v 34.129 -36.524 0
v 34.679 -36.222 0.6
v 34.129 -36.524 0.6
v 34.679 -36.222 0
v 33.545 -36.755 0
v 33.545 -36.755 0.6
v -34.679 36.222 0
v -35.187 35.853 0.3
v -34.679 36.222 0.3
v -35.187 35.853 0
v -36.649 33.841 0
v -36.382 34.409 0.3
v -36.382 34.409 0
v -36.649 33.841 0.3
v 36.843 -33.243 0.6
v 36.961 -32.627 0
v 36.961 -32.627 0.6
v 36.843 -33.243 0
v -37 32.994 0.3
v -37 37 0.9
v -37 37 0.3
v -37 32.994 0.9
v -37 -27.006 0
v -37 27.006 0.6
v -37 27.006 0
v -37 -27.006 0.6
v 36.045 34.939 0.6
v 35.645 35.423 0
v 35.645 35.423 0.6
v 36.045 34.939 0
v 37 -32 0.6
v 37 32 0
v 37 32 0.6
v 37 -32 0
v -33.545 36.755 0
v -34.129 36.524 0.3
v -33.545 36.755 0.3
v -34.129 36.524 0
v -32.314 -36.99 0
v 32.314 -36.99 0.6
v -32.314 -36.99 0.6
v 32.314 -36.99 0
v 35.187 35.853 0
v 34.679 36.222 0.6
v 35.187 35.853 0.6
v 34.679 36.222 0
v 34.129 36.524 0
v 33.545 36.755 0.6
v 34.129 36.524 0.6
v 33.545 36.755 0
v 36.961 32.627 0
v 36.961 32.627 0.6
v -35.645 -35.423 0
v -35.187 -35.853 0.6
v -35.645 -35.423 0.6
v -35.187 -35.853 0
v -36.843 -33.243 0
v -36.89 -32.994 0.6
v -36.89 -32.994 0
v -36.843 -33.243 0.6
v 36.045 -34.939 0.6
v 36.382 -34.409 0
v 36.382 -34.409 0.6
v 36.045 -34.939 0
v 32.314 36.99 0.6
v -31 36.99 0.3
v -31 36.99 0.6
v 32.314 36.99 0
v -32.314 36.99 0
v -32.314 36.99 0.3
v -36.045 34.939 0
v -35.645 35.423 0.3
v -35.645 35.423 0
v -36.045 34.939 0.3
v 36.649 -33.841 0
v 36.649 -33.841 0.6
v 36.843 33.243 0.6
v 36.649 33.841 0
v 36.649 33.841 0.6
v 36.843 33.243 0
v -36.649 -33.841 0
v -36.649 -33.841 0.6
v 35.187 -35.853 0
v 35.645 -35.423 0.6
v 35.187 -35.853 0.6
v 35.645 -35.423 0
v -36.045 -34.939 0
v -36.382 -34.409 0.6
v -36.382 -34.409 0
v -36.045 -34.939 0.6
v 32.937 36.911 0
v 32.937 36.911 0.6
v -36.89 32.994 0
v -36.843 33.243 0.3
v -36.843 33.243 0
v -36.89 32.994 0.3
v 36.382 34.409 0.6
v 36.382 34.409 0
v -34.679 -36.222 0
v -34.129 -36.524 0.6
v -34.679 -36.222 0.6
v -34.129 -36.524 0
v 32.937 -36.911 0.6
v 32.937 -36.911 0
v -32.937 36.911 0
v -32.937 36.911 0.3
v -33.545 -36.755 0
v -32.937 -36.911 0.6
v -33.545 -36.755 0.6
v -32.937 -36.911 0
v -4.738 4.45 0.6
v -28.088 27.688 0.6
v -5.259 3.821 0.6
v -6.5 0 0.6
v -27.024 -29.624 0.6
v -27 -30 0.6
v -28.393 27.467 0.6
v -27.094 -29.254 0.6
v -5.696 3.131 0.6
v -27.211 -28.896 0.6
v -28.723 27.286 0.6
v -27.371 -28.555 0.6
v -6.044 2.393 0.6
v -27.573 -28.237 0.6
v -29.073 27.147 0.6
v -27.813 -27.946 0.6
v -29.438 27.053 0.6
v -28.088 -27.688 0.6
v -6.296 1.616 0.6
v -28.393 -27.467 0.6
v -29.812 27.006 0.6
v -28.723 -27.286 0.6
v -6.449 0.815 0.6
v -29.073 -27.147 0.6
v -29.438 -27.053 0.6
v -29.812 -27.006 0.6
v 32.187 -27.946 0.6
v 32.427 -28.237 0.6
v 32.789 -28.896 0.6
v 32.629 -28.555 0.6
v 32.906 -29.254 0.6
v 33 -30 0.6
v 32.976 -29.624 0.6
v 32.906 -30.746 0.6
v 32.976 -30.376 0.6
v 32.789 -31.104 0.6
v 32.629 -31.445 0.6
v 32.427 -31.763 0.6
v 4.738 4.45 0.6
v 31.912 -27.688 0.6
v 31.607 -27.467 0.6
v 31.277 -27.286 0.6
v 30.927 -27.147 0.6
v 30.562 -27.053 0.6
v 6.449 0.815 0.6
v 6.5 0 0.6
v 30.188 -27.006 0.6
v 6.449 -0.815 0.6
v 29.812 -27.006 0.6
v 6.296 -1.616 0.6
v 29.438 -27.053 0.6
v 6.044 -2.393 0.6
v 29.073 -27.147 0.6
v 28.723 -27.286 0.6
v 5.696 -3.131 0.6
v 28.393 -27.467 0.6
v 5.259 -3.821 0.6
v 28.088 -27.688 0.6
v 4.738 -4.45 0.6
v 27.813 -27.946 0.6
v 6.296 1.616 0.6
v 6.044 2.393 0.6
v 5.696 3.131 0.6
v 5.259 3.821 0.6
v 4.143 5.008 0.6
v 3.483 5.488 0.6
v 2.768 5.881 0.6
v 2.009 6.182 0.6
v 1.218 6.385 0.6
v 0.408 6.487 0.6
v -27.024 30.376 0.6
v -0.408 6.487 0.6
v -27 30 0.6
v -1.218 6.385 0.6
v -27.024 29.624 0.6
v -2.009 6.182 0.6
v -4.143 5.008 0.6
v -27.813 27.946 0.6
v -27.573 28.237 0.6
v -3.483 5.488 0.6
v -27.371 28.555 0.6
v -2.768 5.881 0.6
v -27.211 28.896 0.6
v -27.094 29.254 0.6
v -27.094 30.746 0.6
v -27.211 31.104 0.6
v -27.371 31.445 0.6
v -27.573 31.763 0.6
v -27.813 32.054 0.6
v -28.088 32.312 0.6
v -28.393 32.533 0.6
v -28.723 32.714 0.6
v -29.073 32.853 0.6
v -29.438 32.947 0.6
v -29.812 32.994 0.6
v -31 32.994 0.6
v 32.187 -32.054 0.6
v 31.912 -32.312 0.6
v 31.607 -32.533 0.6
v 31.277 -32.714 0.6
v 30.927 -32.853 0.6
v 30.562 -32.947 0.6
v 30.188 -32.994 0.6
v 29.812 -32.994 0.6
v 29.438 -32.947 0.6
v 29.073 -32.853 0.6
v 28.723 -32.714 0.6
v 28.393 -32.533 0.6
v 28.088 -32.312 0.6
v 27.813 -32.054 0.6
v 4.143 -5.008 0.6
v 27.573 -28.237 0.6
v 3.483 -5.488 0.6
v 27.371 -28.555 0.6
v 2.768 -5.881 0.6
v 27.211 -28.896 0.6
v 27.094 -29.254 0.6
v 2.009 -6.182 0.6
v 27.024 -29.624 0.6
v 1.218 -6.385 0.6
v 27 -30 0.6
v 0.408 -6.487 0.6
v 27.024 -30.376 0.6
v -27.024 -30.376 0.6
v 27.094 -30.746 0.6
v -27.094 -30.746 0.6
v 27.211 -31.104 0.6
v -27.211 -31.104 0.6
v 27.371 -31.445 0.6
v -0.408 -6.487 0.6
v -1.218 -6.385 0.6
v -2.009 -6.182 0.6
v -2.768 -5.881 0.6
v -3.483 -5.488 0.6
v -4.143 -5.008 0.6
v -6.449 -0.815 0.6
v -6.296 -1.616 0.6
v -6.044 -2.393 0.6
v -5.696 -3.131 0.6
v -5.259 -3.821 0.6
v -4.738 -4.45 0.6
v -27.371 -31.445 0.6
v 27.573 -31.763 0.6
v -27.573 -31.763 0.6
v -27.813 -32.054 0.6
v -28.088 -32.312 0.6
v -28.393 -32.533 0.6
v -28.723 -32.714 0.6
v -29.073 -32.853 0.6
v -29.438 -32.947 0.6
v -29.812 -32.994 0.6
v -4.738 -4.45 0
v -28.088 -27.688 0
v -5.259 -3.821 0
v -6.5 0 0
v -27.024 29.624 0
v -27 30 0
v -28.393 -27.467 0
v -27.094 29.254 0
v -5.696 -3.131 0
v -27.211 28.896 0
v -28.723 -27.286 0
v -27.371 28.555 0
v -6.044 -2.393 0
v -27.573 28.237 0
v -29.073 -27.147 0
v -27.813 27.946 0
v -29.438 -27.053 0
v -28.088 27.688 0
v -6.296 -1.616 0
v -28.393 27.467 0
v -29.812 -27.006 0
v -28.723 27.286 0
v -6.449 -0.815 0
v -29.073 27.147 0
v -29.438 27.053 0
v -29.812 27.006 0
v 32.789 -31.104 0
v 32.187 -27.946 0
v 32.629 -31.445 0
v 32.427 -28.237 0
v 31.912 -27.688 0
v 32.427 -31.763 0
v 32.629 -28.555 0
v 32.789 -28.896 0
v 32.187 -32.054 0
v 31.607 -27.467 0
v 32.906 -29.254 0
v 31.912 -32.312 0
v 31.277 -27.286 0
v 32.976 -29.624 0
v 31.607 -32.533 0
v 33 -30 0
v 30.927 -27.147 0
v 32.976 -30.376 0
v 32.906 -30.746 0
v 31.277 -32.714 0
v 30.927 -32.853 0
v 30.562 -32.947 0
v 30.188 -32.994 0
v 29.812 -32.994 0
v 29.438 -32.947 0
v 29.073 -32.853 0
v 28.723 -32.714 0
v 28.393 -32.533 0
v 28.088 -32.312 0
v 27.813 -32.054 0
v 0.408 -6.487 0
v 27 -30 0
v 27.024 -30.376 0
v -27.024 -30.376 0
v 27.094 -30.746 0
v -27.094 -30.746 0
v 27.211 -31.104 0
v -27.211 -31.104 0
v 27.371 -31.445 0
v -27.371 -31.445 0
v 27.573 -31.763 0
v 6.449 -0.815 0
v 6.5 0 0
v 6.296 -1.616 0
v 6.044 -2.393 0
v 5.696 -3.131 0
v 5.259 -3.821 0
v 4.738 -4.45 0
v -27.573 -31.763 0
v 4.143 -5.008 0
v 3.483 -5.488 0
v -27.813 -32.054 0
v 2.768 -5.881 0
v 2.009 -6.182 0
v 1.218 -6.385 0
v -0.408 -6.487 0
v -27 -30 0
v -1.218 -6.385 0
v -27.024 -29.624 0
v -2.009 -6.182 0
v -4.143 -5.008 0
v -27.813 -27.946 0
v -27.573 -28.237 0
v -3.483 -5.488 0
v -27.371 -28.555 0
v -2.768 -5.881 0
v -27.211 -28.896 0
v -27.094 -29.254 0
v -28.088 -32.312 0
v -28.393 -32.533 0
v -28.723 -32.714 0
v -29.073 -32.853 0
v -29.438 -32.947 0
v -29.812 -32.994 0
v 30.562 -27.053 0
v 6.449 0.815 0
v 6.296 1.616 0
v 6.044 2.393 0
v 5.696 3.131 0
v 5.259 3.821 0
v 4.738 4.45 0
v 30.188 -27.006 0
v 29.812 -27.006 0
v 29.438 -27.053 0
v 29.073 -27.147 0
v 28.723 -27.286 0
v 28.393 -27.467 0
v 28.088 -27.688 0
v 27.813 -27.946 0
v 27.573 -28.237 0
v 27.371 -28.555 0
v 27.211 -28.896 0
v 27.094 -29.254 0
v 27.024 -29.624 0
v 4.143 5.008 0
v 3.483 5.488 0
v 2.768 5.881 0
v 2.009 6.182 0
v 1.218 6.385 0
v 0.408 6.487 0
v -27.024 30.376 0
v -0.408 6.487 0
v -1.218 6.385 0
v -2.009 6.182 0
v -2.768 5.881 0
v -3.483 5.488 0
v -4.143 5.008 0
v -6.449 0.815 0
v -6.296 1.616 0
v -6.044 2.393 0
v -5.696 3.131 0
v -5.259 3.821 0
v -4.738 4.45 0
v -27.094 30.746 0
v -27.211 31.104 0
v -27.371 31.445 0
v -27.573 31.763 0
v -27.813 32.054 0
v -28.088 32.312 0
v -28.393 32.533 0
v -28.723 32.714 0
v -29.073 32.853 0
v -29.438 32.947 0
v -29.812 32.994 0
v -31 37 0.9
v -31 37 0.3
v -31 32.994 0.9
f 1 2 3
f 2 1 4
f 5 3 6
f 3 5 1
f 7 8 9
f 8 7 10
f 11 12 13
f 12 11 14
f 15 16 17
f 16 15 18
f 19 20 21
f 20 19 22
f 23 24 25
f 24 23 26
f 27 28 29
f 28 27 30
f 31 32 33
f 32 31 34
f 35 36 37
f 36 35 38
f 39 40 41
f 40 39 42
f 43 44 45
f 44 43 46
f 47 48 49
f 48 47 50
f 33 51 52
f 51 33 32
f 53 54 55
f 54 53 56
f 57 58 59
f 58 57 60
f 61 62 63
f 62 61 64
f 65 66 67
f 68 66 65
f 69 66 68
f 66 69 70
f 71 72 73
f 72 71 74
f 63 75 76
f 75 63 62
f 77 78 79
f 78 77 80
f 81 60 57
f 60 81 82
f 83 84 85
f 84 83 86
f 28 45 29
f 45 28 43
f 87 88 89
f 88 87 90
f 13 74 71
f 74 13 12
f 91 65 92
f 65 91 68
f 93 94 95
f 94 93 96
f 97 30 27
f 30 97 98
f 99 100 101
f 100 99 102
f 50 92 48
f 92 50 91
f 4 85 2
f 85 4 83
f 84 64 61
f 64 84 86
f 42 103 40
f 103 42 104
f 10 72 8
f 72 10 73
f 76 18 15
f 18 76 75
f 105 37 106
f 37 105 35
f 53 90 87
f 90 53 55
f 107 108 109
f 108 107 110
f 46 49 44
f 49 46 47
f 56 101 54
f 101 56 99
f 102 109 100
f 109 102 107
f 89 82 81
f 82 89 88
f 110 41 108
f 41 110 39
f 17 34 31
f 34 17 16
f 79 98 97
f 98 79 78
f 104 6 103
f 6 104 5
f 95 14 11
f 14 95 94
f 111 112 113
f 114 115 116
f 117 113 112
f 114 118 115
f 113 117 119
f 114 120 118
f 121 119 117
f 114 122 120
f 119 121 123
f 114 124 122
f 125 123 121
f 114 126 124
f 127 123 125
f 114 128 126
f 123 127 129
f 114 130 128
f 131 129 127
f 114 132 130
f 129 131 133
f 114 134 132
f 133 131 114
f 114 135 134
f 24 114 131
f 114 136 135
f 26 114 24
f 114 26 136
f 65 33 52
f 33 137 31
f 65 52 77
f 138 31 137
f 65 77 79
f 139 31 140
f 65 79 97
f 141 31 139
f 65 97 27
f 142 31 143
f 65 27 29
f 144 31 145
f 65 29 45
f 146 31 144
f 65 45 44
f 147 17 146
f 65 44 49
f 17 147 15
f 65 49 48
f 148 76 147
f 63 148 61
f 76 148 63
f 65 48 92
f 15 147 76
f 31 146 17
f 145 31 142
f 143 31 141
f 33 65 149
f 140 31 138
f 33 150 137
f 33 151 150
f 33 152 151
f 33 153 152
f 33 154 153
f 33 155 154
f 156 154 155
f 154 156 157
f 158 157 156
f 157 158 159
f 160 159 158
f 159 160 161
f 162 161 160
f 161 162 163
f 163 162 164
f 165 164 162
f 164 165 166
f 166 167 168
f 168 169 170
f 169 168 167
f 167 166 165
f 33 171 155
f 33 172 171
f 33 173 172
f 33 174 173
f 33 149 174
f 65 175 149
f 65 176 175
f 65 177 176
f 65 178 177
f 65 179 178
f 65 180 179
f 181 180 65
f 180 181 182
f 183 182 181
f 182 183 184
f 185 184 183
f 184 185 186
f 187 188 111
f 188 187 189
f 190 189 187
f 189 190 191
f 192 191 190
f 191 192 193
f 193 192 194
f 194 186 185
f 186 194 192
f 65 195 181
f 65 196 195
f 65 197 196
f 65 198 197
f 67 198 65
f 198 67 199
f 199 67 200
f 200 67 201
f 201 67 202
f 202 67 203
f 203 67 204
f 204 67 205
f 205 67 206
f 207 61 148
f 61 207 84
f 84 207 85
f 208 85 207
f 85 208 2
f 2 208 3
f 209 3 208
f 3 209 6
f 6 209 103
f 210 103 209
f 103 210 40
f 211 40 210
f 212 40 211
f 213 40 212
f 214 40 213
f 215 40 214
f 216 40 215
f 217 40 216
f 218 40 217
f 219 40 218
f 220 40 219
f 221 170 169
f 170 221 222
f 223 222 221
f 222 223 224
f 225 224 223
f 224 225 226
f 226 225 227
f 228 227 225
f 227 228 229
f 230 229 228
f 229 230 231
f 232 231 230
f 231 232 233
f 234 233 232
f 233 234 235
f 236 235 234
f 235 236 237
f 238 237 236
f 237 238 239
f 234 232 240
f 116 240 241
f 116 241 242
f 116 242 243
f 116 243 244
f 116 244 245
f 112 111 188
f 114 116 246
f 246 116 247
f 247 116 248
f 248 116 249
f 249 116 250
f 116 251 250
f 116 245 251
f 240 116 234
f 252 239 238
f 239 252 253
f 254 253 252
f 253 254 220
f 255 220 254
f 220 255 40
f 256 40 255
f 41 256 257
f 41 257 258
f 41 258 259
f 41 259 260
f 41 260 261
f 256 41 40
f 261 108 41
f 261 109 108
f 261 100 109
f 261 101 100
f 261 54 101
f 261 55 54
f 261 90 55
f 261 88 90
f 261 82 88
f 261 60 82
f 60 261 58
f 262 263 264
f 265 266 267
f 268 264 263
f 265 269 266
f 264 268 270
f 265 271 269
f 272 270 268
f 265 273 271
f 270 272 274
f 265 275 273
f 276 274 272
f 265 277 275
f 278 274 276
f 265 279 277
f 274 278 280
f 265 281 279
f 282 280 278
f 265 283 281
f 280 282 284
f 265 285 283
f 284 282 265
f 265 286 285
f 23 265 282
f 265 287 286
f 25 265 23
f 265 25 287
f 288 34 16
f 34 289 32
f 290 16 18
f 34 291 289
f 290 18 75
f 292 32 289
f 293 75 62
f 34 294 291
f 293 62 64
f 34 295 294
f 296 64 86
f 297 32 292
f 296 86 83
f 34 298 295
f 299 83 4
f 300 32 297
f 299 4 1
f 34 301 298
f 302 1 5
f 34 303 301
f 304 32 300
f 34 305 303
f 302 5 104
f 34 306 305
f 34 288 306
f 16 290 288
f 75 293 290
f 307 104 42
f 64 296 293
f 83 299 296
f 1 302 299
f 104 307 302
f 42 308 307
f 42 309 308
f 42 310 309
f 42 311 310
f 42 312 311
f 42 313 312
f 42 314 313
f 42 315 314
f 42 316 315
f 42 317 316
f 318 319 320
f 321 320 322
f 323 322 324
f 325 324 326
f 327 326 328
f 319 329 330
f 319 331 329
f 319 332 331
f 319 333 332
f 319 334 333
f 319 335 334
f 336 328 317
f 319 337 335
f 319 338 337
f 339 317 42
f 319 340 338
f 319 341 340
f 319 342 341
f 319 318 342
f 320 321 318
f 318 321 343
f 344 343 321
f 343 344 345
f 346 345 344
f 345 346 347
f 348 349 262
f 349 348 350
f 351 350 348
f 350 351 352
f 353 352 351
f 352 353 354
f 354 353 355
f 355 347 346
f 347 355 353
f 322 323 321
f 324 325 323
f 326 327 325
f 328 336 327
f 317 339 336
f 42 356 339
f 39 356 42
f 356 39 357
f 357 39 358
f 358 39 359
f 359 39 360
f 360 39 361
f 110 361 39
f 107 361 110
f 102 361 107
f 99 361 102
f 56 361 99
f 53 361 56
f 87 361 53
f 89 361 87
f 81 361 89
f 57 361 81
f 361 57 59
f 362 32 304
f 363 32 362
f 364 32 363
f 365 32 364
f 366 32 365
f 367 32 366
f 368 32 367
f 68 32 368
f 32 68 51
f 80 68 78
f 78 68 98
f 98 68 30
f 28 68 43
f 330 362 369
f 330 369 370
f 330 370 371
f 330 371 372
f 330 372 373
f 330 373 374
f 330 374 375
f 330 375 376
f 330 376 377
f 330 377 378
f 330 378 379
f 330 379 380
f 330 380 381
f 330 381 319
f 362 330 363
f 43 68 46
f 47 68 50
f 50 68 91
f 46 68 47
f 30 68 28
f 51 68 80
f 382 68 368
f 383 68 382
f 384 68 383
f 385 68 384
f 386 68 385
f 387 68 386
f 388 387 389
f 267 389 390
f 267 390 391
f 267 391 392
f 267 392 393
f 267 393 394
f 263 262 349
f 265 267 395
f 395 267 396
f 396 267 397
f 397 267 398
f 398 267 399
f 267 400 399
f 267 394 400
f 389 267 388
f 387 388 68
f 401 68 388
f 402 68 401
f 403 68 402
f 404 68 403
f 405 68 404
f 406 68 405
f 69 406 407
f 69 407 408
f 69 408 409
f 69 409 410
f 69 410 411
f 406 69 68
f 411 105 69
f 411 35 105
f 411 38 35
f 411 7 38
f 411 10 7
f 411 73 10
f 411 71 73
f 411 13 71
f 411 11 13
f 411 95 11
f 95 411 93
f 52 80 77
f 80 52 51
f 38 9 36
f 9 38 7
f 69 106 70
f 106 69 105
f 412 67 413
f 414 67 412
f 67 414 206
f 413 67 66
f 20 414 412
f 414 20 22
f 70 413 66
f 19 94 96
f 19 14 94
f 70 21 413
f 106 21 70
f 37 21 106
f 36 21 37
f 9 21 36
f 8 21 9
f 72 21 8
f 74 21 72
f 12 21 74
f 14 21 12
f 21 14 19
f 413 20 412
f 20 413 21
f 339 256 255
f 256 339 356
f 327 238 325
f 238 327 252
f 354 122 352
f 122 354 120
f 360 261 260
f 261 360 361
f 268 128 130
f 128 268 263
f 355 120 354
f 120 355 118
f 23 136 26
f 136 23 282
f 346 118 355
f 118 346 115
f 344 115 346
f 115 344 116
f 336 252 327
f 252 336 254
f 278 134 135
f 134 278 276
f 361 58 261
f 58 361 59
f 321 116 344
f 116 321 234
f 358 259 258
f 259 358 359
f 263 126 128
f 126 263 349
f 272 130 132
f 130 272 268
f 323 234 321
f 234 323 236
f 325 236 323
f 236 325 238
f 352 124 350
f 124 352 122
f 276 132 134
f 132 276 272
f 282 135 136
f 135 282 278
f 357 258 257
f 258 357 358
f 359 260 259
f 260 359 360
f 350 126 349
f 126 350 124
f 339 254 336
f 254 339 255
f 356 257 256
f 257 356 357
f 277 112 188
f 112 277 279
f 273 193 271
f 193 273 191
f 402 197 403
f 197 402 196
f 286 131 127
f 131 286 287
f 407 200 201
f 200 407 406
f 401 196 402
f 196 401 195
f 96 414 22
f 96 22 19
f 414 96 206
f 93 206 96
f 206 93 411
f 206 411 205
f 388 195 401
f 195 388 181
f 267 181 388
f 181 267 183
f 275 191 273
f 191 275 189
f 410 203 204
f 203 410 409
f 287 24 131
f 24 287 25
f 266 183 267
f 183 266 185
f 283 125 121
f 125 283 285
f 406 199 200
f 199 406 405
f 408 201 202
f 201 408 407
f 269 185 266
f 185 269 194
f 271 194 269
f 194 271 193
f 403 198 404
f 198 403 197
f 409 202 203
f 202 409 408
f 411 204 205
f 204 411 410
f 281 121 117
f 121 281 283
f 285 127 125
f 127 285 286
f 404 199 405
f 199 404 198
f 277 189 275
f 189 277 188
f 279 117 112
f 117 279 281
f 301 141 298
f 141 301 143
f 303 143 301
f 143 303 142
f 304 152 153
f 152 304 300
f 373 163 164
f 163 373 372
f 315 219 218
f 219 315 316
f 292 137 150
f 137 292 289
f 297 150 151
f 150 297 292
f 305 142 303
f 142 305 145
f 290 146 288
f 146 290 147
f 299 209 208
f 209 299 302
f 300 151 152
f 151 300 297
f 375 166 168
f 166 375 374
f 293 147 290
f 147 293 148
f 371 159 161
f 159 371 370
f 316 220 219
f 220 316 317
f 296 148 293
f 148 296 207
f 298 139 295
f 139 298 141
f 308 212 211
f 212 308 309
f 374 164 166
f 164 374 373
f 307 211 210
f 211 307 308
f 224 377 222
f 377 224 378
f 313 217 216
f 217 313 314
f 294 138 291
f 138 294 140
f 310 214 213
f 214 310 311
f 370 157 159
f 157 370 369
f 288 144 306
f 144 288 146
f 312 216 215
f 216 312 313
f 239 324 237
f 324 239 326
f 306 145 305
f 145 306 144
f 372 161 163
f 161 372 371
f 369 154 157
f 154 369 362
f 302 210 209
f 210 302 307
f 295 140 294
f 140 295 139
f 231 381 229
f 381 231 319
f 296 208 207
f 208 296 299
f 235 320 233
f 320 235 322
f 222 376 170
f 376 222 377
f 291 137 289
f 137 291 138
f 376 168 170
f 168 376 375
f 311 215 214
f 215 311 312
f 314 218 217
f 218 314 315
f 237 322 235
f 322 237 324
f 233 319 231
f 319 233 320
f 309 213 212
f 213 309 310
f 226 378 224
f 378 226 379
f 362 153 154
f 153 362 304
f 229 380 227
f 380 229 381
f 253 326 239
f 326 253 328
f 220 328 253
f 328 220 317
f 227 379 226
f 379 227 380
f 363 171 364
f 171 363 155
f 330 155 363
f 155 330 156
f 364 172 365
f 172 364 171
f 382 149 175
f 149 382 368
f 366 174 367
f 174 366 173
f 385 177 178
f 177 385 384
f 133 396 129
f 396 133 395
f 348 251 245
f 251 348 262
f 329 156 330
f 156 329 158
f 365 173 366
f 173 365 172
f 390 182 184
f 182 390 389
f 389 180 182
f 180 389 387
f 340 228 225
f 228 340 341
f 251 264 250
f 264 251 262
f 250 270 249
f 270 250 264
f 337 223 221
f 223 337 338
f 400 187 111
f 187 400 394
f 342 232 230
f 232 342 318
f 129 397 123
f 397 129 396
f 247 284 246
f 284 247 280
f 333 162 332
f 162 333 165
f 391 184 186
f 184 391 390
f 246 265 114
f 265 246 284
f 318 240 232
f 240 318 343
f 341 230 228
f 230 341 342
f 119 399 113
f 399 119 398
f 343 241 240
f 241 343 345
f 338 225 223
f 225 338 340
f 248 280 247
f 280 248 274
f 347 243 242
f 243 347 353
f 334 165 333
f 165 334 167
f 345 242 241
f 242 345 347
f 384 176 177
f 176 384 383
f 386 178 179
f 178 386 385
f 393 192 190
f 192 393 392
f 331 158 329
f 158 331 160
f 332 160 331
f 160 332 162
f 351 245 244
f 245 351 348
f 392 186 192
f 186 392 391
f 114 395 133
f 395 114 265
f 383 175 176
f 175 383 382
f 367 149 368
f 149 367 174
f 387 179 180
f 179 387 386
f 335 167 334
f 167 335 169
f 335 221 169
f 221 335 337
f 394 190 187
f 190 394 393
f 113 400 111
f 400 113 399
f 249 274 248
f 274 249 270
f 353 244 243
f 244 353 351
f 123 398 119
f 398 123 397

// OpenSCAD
$fn = 50;


difference() {
	union() {
		translate(v = [0, 0, 0]) {
			rotate(a = [0, 0, 0]) {
				hull() {
					translate(v = [-32.0000000000, 32.0000000000, 0]) {
						rotate(a = [0, 0, 0]) {
							translate(v = [0, 0, 0]) {
								rotate(a = [0, 0, 0]) {
									cylinder(h = 0.6000000000, r = 5);
								}
							}
						}
					}
					translate(v = [32.0000000000, 32.0000000000, 0]) {
						rotate(a = [0, 0, 0]) {
							translate(v = [0, 0, 0]) {
								rotate(a = [0, 0, 0]) {
									cylinder(h = 0.6000000000, r = 5);
								}
							}
						}
					}
					translate(v = [-32.0000000000, -32.0000000000, 0]) {
						rotate(a = [0, 0, 0]) {
							translate(v = [0, 0, 0]) {
								rotate(a = [0, 0, 0]) {
									cylinder(h = 0.6000000000, r = 5);
								}
							}
						}
					}
					translate(v = [32.0000000000, -32.0000000000, 0]) {
						rotate(a = [0, 0, 0]) {
							translate(v = [0, 0, 0]) {
								rotate(a = [0, 0, 0]) {
									cylinder(h = 0.6000000000, r = 5);
								}
							}
						}
					}
				}
			}
		}
		#translate(v = [-37.0000000000, 31.0000000000, 0.3000000000]) {
			rotate(a = [0, 0, 0]) {
				cube(size = [6, 6, 0.6000000000]);
			}
		}
	}
	union() {
		translate(v = [-37.5000000000, -30.0000000000, -125]) {
			rotate(a = [0, 0, 0]) {
				hull() {
					translate(v = [7.5000000000, 0, 0]) {
						rotate(a = [0, 0, 0]) {
							translate(v = [0, 0, 0]) {
								rotate(a = [0, 0, 0]) {
									cylinder(h = 250, r = 3.0000000000);
								}
							}
						}
					}
					translate(v = [-7.5000000000, 0, 0]) {
						rotate(a = [0, 0, 0]) {
							translate(v = [0, 0, 0]) {
								rotate(a = [0, 0, 0]) {
									cylinder(h = 250, r = 3.0000000000);
								}
							}
						}
					}
				}
			}
		}
		translate(v = [-37.5000000000, 30.0000000000, -125]) {
			rotate(a = [0, 0, 0]) {
				hull() {
					translate(v = [7.5000000000, 0, 0]) {
						rotate(a = [0, 0, 0]) {
							translate(v = [0, 0, 0]) {
								rotate(a = [0, 0, 0]) {
									cylinder(h = 250, r = 3.0000000000);
								}
							}
						}
					}
					translate(v = [-7.5000000000, 0, 0]) {
						rotate(a = [0, 0, 0]) {
							translate(v = [0, 0, 0]) {
								rotate(a = [0, 0, 0]) {
									cylinder(h = 250, r = 3.0000000000);
								}
							}
						}
					}
				}
			}
		}
		translate(v = [30.0000000000, -30.0000000000, -125.0000000000]) {
			rotate(a = [0, 0, 0]) {
				cylinder(h = 250, r = 3.0000000000);
			}
		}
		translate(v = [0, 0, 0.0000000000]) {
			rotate(a = [0, 0, 0]) {
				cylinder(h = 0.6000000000, r = 6.5000000000);
			}
		}
	}
}
